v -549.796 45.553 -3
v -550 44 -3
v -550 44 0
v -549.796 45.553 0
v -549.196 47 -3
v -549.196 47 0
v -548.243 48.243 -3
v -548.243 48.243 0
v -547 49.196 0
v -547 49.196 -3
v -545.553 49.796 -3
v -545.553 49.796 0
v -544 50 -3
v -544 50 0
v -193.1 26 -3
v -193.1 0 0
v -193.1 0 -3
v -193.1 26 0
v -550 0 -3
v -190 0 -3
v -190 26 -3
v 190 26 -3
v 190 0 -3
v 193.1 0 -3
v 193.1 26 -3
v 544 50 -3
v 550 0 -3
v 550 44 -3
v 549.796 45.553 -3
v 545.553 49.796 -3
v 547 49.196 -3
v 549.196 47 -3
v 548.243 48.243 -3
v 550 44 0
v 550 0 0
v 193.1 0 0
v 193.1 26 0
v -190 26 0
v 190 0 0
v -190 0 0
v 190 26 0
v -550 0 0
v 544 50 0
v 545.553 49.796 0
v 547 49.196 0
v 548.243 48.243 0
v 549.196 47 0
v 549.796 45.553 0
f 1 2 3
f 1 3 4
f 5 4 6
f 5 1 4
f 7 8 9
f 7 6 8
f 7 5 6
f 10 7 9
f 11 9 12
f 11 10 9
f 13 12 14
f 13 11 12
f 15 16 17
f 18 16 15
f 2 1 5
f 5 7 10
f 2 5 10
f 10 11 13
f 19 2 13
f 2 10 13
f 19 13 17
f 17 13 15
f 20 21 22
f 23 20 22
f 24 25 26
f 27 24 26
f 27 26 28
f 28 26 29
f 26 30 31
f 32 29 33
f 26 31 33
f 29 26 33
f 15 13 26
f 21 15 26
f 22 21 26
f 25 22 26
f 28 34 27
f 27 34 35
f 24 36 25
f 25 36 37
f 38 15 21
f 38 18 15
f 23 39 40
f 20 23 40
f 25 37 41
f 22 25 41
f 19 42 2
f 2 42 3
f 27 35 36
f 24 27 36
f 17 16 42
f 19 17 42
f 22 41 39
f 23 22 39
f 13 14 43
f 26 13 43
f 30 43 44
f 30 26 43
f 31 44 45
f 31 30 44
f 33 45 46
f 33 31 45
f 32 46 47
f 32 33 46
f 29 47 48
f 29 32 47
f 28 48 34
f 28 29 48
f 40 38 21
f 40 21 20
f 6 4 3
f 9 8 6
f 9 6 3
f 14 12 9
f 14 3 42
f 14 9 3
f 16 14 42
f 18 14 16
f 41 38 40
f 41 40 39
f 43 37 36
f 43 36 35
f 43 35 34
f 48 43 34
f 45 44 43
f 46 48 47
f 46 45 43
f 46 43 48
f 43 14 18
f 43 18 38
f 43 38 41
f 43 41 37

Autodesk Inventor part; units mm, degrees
ref_plane "YZ Plane" through (0, 0, 0) normal (1, 0, 0) x (0, 1, 0)
ref_plane "XZ Plane" through (0, 0, 0) normal (0, 1, 0) x (-1, 0, 0)
ref_plane "XY Plane" through (0, 0, 0) normal (0, 0, 1) x (1, 0, 0)
sketch "Sketch1" plane through (0, 0, 0) normal (0, 0, 1) x (1, 0, 0)
  line L0 (-550, 50) -> (550, 50)
  line L1 (550, 50) -> (550, 0)
  line L2 (550, 0) -> (-550, 0)
  line L3 (-550, 0) -> (-550, 50)
  circle A0 centre (-550, 0) radius 25
  circle A1 centre (550, 0) radius 25
  line L4 (550, 0) -> (607.2042, 48)
  line L5 (607.2042, 48) -> (607.2042, 50)
  line L6 (607.2042, 50) -> (550, 50)
  point P0 (0, 0)
  point P1 (0, 0)
  point P2 (-550, 25)
  point P3 (-525, 0)
  point P4 (525, 0)
  point P5 (550, 25)
  point P6 (569.1511, 16.0697)
  dimension "d16" = 50
  dimension "d17" = 1100
  dimension "d18" = 50
  dimension "d19" = 50
  dimension "d32" = 2
  dimension "d33" = 50
extrude "Plate2" add sketch "Sketch1" against normal blind 3 contours L0 L1 A1 L2 A0 L3 | A0 L2 L3 | L1 L2 A1 picked at (-548.1457, 16.4577)
sketch "Sketch2" plane through (0, 0, 0) normal (0, 0, 1) x (1, 0, 0)
  line L0 (-550, 0) -> (550, 0) projected
  line L1 (550, 50) -> (-550, 50) projected
  line L2 (-191.55, 26) -> (-191.55, 202.9149) construction
  line L3 (-193.1, 26) -> (-190, 26)
  line L4 (-190, 26) -> (-190, 0)
  line L5 (-190, 0) -> (-193.1, 0)
  line L6 (-193.1, 0) -> (-193.1, 26)
  line L7 (191.55, 26) -> (191.55, 202.9149) construction
  line L8 (190, 0) -> (193.1, 0)
  line L9 (193.1, 0) -> (193.1, 26)
  line L10 (193.1, 26) -> (190, 26)
  line L11 (190, 26) -> (190, 0)
  line L12 (0, 236.7146) -> (0, 0) construction
  point P0 (0, 0)
  point P1 (190, 0)
  point P2 (-190, 0)
  dimension "d39" = 26
  dimension "d41" = 3.1
  dimension "d43" = 380
extrude "Extrusion1" cut sketch "Sketch2" against normal through all
sketch "Sketch4" plane through (0, 0, 0) normal (0, 0, 1) x (1, 0, 0)
  line L0 (-62.2268, 17.4688) -> (-62.2268, 36.055) construction
  line L1 (-62.2268, 36.055) -> (59.8015, 36.055) construction
  line L2 (59.8015, 36.055) -> (59.8015, 17.4688) construction
  line L3 (59.8015, 17.4688) -> (-62.2268, 17.4688) construction
  point P0 (0, 0)
mark "Mark1"
fillet "Corner Round2" radius 6 2 edges at (-550, 50, -1.5) (550, 50, -1.5)
equation "\"d20\" = Thickness"
equation "\"BendReliefWidth\" = Thickness"
equation "\"BendReliefDepth\" = 0.5 * Thickness"
equation "\"CornerReliefSize\" = 4 * Thickness"
equation "\"MinimumRemnant\" = 2 * Thickness"
equation "\"TransitionRadius\" = BendRadius"
equation "\"JacobiRadiusSize\" = BendRadius"
equation "\"GapSize\" = Thickness"
equation "\"Thickness\" = 3"
equation "\"BendRadius\" = 5"
properties part number "MSC 108 RIB CONE" material "Stainless Steel"
